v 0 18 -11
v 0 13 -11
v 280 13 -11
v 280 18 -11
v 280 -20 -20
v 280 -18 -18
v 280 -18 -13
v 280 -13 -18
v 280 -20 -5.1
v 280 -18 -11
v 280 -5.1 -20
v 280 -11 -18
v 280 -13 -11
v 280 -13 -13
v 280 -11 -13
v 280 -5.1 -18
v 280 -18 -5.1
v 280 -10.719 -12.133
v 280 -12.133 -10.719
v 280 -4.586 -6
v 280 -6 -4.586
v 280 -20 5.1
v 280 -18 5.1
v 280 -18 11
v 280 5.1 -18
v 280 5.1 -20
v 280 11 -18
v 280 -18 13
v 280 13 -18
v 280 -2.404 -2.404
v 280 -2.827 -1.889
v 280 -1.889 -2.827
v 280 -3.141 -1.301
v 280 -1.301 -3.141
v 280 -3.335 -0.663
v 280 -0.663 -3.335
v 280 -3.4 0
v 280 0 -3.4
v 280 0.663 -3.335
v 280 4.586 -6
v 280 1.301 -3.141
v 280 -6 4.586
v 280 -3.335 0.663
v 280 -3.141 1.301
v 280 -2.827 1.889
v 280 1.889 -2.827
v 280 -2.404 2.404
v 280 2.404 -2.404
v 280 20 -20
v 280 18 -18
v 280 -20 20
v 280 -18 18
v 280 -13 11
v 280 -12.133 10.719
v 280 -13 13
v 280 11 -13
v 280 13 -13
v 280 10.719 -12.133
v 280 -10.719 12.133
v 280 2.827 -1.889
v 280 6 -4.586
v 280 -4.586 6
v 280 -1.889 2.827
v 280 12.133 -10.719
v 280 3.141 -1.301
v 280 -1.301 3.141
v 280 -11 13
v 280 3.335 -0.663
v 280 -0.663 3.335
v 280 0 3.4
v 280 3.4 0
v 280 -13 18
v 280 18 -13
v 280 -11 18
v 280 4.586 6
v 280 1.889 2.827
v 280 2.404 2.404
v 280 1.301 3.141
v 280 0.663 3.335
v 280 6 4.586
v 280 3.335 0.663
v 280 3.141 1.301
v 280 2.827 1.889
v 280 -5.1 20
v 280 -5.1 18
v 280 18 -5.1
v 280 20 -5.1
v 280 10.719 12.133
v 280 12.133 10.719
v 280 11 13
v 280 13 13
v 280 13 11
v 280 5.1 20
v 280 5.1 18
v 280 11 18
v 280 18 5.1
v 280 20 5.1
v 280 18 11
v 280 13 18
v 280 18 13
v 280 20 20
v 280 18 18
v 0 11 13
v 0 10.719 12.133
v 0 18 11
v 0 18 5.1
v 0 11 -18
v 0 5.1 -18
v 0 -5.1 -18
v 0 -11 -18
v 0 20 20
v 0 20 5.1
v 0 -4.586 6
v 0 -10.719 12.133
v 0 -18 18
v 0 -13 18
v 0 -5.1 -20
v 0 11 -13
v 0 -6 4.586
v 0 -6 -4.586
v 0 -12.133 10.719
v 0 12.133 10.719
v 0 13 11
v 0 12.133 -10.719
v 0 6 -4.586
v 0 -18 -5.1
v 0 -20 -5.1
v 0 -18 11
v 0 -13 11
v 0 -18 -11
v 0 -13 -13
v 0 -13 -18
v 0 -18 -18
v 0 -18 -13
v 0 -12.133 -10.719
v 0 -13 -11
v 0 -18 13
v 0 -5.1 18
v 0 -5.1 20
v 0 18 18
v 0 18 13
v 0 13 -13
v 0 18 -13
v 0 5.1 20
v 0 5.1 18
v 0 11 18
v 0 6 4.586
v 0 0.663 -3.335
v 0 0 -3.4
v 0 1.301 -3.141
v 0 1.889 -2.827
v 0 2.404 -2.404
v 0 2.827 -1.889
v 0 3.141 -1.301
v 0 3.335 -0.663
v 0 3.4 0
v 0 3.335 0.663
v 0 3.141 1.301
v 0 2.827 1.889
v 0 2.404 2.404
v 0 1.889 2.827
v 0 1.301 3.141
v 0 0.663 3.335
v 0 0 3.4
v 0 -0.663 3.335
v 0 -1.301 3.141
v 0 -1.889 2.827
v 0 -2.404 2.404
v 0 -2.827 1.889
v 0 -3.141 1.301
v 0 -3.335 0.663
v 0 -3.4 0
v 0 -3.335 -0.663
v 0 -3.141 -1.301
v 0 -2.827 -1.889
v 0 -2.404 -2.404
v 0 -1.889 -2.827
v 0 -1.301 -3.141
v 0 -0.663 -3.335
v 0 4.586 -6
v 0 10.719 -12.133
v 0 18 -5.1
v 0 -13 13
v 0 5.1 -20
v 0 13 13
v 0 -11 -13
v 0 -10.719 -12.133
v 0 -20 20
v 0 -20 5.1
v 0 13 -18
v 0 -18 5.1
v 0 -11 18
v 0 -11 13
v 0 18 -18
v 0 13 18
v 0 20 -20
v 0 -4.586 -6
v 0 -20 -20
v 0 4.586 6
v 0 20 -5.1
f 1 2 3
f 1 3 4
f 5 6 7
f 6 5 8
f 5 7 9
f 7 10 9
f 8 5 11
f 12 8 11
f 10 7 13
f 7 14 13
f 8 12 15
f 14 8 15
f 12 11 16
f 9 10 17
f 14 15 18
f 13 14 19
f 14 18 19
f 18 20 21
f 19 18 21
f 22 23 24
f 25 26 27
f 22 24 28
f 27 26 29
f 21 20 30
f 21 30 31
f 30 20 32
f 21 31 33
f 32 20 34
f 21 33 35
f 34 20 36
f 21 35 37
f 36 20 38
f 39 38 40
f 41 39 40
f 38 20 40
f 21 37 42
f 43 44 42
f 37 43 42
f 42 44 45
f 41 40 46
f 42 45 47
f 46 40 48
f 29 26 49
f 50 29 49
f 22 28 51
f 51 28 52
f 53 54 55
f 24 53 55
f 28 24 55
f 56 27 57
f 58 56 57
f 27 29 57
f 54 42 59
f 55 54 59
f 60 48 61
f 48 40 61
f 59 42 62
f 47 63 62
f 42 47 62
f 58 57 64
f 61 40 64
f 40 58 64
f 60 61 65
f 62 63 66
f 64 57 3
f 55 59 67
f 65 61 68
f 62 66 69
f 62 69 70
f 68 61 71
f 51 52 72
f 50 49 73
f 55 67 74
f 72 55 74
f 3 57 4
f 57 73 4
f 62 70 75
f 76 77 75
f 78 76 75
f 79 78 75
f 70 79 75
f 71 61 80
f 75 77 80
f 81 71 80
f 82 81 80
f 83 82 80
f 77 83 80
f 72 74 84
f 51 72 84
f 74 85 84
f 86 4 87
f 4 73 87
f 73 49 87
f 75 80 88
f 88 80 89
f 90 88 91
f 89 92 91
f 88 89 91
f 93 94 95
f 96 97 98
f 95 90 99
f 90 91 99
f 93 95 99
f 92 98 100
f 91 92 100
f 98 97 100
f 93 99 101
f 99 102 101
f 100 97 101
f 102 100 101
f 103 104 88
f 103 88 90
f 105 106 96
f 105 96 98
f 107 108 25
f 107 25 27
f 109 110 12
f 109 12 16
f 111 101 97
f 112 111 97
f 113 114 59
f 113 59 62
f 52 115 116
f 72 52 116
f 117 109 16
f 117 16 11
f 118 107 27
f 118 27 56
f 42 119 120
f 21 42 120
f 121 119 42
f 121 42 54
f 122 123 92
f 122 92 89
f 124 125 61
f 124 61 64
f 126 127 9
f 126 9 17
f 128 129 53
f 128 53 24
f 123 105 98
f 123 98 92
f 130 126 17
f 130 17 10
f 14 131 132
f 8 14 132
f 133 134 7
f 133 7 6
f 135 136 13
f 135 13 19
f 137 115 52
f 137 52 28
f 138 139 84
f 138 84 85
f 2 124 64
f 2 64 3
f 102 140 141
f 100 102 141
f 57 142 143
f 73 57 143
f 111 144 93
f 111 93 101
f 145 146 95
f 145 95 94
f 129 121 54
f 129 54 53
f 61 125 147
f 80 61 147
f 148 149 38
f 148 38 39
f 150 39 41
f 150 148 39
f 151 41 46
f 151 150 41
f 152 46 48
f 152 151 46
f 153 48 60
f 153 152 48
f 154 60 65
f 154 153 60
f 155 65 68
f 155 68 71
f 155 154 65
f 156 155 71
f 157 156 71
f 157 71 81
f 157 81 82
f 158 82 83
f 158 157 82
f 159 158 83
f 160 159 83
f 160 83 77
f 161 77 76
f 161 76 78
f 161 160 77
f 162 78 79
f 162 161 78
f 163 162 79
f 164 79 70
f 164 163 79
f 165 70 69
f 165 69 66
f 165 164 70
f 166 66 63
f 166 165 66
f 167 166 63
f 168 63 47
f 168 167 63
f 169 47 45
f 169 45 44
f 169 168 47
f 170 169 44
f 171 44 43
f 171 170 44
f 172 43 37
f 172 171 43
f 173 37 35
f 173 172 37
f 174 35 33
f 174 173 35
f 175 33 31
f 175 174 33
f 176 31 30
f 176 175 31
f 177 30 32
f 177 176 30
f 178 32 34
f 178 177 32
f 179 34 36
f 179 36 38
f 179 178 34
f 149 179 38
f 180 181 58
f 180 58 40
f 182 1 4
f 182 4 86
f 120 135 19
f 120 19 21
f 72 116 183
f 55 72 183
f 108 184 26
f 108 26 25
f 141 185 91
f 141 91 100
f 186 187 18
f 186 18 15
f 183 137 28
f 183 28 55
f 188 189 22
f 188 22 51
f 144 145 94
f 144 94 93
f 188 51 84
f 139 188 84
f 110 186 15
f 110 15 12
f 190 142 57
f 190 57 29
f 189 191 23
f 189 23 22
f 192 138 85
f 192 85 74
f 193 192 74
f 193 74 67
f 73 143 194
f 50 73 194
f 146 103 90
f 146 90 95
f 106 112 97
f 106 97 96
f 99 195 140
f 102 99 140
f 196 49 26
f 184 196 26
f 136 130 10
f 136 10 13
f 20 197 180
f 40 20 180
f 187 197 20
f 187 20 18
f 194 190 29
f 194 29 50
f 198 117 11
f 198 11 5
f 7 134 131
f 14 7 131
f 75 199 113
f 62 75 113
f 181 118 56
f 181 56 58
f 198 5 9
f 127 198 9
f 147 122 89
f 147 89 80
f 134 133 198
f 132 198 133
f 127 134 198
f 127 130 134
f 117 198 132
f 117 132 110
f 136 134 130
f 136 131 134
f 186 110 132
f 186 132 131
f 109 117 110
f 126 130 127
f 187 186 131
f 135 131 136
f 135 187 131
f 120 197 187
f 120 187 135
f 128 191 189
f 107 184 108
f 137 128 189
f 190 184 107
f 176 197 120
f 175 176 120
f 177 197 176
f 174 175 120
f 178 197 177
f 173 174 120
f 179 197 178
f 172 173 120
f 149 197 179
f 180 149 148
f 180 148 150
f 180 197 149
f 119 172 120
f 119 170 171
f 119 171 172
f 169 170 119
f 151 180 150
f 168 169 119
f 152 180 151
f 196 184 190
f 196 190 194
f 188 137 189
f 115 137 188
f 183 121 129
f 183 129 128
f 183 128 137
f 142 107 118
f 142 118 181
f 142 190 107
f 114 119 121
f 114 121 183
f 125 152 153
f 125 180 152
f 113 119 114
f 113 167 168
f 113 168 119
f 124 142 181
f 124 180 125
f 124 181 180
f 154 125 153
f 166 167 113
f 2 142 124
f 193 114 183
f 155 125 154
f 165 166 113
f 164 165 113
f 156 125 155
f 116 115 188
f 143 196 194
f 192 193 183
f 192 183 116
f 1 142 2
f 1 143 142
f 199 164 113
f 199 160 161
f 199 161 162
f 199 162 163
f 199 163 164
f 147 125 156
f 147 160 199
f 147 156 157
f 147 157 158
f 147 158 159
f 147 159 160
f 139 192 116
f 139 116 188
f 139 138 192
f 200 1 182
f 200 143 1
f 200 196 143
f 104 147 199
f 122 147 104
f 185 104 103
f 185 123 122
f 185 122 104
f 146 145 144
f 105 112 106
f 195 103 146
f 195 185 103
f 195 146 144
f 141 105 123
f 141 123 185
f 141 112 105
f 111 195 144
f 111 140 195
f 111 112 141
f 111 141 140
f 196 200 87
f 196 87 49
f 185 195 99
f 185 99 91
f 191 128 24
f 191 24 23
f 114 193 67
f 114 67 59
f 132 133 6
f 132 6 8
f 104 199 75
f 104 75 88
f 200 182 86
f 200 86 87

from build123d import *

# Parameters (mm, degrees)
SKETCH_1_R      = 3.4
SKETCH_1_W      = 5
SKETCH_1_H      = 5
EXTRUDE_1_DEPTH = 280


with BuildPart() as part:
    # 草图1 → 凸台-拉伸1 (new body)
    with BuildSketch(Plane(origin=(0, 0, 0), x_dir=(0, 0, -1), z_dir=(1, 0, 0))):
        Polygon((0, 6), (4.585786438, 6), (10.718811909, 12.133025471), (11, 13), (11, 18), (5.1, 18), (5.1, 20), (20, 20), (20, 5.1), (18, 5.1), (18, 11), (13, 11), (12.133025471, 10.718811909), (6, 4.585786438), (6, 0), (6, -4.585786438), (12.133025471, -10.718811909), (13, -11), (18, -11), (18, -5.1), (20, -5.1), (20, -20), (5.1, -20), (5.1, -18), (11, -18), (11, -13), (10.718811909, -12.133025471), (4.585786438, -6), (0, -6), (-4.585786438, -6), (-10.718811909, -12.133025471), (-11, -13), (-11, -18), (-5.1, -18), (-5.1, -20), (-20, -20), (-20, -5.1), (-18, -5.1), (-18, -11), (-13, -11), (-12.133025471, -10.718811909), (-6, -4.585786438), (-6, 0), (-6, 4.585786438), (-12.133025471, 10.718811909), (-13, 11), (-18, 11), (-18, 5.1), (-20, 5.1), (-20, 20), (-5.1, 20), (-5.1, 18), (-11, 18), (-11, 13), (-10.718811909, 12.133025471), (-4.585786438, 6), align=None)
        Circle(SKETCH_1_R, mode=Mode.SUBTRACT)
        with Locations((15.5, -15.5)):
            Rectangle(SKETCH_1_W, SKETCH_1_H, mode=Mode.SUBTRACT)
        with Locations((15.5, 15.5)):
            Rectangle(SKETCH_1_W, SKETCH_1_H, mode=Mode.SUBTRACT)
        with Locations((-15.5, -15.5)):
            Rectangle(SKETCH_1_W, SKETCH_1_H, mode=Mode.SUBTRACT)
        with Locations((-15.5, 15.5)):
            Rectangle(SKETCH_1_W, SKETCH_1_H, mode=Mode.SUBTRACT)
    extrude(amount=EXTRUDE_1_DEPTH)


solid = part.part
